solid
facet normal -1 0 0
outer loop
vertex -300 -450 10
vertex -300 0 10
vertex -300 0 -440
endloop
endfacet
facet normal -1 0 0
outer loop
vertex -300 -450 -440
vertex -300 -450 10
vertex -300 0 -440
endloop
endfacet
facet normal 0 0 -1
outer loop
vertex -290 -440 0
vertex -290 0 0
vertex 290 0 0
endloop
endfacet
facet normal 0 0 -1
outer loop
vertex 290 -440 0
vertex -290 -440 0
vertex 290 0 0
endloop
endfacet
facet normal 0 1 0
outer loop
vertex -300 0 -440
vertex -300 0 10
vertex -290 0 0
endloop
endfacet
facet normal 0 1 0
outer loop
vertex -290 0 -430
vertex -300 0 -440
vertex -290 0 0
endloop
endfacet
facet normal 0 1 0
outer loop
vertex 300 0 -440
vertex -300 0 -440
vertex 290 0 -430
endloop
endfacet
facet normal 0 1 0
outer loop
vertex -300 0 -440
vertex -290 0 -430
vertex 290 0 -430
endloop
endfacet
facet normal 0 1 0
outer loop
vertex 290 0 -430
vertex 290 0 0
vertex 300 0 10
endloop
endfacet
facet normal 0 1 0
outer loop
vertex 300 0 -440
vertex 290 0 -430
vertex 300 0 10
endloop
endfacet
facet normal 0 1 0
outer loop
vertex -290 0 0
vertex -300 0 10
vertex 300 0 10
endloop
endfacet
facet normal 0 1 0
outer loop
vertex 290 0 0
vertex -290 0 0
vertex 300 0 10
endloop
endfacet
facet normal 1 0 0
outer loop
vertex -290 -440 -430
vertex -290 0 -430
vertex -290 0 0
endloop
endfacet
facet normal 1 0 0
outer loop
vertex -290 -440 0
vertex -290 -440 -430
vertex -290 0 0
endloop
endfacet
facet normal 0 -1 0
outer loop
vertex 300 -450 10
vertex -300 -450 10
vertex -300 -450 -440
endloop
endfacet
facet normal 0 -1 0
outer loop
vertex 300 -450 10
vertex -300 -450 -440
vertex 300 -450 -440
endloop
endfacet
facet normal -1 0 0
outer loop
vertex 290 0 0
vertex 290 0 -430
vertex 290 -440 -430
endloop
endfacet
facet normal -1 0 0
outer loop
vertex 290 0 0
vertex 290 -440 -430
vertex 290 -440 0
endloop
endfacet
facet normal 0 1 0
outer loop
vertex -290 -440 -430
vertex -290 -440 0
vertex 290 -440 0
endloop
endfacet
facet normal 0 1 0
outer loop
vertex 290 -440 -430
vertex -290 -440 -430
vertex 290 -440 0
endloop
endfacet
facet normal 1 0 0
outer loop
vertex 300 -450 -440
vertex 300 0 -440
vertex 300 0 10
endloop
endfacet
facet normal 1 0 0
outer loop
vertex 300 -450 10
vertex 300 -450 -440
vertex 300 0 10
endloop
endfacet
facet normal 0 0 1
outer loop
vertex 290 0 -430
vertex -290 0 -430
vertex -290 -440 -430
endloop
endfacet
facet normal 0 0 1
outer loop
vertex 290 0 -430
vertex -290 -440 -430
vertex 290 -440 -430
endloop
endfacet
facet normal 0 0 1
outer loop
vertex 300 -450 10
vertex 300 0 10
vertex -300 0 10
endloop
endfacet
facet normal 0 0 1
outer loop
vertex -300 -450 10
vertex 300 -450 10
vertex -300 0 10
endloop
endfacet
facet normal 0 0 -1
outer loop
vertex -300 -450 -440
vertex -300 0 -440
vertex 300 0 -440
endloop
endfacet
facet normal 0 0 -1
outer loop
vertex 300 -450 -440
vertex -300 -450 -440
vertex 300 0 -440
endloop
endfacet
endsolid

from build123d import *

# Parameters (mm, degrees)
F2_DEPTH = 450
F1_W     = 580
F1_H     = 430
F3_DEPTH = 440


with BuildPart() as f2:
    # F0 (on Front) → F2 (new body)
    with BuildSketch(Plane.XZ):
        Polygon((0, 10), (-300, 10), (-300, -440), (300, -440), (300, 10), align=None)
    extrude(amount=F2_DEPTH)

    # F1 (on Front) → F3 (cut)
    with BuildSketch(Plane.XZ):
        with Locations((0, -215)):
            Rectangle(F1_W, F1_H)
    extrude(amount=F3_DEPTH, mode=Mode.SUBTRACT)


solid = f2.part
